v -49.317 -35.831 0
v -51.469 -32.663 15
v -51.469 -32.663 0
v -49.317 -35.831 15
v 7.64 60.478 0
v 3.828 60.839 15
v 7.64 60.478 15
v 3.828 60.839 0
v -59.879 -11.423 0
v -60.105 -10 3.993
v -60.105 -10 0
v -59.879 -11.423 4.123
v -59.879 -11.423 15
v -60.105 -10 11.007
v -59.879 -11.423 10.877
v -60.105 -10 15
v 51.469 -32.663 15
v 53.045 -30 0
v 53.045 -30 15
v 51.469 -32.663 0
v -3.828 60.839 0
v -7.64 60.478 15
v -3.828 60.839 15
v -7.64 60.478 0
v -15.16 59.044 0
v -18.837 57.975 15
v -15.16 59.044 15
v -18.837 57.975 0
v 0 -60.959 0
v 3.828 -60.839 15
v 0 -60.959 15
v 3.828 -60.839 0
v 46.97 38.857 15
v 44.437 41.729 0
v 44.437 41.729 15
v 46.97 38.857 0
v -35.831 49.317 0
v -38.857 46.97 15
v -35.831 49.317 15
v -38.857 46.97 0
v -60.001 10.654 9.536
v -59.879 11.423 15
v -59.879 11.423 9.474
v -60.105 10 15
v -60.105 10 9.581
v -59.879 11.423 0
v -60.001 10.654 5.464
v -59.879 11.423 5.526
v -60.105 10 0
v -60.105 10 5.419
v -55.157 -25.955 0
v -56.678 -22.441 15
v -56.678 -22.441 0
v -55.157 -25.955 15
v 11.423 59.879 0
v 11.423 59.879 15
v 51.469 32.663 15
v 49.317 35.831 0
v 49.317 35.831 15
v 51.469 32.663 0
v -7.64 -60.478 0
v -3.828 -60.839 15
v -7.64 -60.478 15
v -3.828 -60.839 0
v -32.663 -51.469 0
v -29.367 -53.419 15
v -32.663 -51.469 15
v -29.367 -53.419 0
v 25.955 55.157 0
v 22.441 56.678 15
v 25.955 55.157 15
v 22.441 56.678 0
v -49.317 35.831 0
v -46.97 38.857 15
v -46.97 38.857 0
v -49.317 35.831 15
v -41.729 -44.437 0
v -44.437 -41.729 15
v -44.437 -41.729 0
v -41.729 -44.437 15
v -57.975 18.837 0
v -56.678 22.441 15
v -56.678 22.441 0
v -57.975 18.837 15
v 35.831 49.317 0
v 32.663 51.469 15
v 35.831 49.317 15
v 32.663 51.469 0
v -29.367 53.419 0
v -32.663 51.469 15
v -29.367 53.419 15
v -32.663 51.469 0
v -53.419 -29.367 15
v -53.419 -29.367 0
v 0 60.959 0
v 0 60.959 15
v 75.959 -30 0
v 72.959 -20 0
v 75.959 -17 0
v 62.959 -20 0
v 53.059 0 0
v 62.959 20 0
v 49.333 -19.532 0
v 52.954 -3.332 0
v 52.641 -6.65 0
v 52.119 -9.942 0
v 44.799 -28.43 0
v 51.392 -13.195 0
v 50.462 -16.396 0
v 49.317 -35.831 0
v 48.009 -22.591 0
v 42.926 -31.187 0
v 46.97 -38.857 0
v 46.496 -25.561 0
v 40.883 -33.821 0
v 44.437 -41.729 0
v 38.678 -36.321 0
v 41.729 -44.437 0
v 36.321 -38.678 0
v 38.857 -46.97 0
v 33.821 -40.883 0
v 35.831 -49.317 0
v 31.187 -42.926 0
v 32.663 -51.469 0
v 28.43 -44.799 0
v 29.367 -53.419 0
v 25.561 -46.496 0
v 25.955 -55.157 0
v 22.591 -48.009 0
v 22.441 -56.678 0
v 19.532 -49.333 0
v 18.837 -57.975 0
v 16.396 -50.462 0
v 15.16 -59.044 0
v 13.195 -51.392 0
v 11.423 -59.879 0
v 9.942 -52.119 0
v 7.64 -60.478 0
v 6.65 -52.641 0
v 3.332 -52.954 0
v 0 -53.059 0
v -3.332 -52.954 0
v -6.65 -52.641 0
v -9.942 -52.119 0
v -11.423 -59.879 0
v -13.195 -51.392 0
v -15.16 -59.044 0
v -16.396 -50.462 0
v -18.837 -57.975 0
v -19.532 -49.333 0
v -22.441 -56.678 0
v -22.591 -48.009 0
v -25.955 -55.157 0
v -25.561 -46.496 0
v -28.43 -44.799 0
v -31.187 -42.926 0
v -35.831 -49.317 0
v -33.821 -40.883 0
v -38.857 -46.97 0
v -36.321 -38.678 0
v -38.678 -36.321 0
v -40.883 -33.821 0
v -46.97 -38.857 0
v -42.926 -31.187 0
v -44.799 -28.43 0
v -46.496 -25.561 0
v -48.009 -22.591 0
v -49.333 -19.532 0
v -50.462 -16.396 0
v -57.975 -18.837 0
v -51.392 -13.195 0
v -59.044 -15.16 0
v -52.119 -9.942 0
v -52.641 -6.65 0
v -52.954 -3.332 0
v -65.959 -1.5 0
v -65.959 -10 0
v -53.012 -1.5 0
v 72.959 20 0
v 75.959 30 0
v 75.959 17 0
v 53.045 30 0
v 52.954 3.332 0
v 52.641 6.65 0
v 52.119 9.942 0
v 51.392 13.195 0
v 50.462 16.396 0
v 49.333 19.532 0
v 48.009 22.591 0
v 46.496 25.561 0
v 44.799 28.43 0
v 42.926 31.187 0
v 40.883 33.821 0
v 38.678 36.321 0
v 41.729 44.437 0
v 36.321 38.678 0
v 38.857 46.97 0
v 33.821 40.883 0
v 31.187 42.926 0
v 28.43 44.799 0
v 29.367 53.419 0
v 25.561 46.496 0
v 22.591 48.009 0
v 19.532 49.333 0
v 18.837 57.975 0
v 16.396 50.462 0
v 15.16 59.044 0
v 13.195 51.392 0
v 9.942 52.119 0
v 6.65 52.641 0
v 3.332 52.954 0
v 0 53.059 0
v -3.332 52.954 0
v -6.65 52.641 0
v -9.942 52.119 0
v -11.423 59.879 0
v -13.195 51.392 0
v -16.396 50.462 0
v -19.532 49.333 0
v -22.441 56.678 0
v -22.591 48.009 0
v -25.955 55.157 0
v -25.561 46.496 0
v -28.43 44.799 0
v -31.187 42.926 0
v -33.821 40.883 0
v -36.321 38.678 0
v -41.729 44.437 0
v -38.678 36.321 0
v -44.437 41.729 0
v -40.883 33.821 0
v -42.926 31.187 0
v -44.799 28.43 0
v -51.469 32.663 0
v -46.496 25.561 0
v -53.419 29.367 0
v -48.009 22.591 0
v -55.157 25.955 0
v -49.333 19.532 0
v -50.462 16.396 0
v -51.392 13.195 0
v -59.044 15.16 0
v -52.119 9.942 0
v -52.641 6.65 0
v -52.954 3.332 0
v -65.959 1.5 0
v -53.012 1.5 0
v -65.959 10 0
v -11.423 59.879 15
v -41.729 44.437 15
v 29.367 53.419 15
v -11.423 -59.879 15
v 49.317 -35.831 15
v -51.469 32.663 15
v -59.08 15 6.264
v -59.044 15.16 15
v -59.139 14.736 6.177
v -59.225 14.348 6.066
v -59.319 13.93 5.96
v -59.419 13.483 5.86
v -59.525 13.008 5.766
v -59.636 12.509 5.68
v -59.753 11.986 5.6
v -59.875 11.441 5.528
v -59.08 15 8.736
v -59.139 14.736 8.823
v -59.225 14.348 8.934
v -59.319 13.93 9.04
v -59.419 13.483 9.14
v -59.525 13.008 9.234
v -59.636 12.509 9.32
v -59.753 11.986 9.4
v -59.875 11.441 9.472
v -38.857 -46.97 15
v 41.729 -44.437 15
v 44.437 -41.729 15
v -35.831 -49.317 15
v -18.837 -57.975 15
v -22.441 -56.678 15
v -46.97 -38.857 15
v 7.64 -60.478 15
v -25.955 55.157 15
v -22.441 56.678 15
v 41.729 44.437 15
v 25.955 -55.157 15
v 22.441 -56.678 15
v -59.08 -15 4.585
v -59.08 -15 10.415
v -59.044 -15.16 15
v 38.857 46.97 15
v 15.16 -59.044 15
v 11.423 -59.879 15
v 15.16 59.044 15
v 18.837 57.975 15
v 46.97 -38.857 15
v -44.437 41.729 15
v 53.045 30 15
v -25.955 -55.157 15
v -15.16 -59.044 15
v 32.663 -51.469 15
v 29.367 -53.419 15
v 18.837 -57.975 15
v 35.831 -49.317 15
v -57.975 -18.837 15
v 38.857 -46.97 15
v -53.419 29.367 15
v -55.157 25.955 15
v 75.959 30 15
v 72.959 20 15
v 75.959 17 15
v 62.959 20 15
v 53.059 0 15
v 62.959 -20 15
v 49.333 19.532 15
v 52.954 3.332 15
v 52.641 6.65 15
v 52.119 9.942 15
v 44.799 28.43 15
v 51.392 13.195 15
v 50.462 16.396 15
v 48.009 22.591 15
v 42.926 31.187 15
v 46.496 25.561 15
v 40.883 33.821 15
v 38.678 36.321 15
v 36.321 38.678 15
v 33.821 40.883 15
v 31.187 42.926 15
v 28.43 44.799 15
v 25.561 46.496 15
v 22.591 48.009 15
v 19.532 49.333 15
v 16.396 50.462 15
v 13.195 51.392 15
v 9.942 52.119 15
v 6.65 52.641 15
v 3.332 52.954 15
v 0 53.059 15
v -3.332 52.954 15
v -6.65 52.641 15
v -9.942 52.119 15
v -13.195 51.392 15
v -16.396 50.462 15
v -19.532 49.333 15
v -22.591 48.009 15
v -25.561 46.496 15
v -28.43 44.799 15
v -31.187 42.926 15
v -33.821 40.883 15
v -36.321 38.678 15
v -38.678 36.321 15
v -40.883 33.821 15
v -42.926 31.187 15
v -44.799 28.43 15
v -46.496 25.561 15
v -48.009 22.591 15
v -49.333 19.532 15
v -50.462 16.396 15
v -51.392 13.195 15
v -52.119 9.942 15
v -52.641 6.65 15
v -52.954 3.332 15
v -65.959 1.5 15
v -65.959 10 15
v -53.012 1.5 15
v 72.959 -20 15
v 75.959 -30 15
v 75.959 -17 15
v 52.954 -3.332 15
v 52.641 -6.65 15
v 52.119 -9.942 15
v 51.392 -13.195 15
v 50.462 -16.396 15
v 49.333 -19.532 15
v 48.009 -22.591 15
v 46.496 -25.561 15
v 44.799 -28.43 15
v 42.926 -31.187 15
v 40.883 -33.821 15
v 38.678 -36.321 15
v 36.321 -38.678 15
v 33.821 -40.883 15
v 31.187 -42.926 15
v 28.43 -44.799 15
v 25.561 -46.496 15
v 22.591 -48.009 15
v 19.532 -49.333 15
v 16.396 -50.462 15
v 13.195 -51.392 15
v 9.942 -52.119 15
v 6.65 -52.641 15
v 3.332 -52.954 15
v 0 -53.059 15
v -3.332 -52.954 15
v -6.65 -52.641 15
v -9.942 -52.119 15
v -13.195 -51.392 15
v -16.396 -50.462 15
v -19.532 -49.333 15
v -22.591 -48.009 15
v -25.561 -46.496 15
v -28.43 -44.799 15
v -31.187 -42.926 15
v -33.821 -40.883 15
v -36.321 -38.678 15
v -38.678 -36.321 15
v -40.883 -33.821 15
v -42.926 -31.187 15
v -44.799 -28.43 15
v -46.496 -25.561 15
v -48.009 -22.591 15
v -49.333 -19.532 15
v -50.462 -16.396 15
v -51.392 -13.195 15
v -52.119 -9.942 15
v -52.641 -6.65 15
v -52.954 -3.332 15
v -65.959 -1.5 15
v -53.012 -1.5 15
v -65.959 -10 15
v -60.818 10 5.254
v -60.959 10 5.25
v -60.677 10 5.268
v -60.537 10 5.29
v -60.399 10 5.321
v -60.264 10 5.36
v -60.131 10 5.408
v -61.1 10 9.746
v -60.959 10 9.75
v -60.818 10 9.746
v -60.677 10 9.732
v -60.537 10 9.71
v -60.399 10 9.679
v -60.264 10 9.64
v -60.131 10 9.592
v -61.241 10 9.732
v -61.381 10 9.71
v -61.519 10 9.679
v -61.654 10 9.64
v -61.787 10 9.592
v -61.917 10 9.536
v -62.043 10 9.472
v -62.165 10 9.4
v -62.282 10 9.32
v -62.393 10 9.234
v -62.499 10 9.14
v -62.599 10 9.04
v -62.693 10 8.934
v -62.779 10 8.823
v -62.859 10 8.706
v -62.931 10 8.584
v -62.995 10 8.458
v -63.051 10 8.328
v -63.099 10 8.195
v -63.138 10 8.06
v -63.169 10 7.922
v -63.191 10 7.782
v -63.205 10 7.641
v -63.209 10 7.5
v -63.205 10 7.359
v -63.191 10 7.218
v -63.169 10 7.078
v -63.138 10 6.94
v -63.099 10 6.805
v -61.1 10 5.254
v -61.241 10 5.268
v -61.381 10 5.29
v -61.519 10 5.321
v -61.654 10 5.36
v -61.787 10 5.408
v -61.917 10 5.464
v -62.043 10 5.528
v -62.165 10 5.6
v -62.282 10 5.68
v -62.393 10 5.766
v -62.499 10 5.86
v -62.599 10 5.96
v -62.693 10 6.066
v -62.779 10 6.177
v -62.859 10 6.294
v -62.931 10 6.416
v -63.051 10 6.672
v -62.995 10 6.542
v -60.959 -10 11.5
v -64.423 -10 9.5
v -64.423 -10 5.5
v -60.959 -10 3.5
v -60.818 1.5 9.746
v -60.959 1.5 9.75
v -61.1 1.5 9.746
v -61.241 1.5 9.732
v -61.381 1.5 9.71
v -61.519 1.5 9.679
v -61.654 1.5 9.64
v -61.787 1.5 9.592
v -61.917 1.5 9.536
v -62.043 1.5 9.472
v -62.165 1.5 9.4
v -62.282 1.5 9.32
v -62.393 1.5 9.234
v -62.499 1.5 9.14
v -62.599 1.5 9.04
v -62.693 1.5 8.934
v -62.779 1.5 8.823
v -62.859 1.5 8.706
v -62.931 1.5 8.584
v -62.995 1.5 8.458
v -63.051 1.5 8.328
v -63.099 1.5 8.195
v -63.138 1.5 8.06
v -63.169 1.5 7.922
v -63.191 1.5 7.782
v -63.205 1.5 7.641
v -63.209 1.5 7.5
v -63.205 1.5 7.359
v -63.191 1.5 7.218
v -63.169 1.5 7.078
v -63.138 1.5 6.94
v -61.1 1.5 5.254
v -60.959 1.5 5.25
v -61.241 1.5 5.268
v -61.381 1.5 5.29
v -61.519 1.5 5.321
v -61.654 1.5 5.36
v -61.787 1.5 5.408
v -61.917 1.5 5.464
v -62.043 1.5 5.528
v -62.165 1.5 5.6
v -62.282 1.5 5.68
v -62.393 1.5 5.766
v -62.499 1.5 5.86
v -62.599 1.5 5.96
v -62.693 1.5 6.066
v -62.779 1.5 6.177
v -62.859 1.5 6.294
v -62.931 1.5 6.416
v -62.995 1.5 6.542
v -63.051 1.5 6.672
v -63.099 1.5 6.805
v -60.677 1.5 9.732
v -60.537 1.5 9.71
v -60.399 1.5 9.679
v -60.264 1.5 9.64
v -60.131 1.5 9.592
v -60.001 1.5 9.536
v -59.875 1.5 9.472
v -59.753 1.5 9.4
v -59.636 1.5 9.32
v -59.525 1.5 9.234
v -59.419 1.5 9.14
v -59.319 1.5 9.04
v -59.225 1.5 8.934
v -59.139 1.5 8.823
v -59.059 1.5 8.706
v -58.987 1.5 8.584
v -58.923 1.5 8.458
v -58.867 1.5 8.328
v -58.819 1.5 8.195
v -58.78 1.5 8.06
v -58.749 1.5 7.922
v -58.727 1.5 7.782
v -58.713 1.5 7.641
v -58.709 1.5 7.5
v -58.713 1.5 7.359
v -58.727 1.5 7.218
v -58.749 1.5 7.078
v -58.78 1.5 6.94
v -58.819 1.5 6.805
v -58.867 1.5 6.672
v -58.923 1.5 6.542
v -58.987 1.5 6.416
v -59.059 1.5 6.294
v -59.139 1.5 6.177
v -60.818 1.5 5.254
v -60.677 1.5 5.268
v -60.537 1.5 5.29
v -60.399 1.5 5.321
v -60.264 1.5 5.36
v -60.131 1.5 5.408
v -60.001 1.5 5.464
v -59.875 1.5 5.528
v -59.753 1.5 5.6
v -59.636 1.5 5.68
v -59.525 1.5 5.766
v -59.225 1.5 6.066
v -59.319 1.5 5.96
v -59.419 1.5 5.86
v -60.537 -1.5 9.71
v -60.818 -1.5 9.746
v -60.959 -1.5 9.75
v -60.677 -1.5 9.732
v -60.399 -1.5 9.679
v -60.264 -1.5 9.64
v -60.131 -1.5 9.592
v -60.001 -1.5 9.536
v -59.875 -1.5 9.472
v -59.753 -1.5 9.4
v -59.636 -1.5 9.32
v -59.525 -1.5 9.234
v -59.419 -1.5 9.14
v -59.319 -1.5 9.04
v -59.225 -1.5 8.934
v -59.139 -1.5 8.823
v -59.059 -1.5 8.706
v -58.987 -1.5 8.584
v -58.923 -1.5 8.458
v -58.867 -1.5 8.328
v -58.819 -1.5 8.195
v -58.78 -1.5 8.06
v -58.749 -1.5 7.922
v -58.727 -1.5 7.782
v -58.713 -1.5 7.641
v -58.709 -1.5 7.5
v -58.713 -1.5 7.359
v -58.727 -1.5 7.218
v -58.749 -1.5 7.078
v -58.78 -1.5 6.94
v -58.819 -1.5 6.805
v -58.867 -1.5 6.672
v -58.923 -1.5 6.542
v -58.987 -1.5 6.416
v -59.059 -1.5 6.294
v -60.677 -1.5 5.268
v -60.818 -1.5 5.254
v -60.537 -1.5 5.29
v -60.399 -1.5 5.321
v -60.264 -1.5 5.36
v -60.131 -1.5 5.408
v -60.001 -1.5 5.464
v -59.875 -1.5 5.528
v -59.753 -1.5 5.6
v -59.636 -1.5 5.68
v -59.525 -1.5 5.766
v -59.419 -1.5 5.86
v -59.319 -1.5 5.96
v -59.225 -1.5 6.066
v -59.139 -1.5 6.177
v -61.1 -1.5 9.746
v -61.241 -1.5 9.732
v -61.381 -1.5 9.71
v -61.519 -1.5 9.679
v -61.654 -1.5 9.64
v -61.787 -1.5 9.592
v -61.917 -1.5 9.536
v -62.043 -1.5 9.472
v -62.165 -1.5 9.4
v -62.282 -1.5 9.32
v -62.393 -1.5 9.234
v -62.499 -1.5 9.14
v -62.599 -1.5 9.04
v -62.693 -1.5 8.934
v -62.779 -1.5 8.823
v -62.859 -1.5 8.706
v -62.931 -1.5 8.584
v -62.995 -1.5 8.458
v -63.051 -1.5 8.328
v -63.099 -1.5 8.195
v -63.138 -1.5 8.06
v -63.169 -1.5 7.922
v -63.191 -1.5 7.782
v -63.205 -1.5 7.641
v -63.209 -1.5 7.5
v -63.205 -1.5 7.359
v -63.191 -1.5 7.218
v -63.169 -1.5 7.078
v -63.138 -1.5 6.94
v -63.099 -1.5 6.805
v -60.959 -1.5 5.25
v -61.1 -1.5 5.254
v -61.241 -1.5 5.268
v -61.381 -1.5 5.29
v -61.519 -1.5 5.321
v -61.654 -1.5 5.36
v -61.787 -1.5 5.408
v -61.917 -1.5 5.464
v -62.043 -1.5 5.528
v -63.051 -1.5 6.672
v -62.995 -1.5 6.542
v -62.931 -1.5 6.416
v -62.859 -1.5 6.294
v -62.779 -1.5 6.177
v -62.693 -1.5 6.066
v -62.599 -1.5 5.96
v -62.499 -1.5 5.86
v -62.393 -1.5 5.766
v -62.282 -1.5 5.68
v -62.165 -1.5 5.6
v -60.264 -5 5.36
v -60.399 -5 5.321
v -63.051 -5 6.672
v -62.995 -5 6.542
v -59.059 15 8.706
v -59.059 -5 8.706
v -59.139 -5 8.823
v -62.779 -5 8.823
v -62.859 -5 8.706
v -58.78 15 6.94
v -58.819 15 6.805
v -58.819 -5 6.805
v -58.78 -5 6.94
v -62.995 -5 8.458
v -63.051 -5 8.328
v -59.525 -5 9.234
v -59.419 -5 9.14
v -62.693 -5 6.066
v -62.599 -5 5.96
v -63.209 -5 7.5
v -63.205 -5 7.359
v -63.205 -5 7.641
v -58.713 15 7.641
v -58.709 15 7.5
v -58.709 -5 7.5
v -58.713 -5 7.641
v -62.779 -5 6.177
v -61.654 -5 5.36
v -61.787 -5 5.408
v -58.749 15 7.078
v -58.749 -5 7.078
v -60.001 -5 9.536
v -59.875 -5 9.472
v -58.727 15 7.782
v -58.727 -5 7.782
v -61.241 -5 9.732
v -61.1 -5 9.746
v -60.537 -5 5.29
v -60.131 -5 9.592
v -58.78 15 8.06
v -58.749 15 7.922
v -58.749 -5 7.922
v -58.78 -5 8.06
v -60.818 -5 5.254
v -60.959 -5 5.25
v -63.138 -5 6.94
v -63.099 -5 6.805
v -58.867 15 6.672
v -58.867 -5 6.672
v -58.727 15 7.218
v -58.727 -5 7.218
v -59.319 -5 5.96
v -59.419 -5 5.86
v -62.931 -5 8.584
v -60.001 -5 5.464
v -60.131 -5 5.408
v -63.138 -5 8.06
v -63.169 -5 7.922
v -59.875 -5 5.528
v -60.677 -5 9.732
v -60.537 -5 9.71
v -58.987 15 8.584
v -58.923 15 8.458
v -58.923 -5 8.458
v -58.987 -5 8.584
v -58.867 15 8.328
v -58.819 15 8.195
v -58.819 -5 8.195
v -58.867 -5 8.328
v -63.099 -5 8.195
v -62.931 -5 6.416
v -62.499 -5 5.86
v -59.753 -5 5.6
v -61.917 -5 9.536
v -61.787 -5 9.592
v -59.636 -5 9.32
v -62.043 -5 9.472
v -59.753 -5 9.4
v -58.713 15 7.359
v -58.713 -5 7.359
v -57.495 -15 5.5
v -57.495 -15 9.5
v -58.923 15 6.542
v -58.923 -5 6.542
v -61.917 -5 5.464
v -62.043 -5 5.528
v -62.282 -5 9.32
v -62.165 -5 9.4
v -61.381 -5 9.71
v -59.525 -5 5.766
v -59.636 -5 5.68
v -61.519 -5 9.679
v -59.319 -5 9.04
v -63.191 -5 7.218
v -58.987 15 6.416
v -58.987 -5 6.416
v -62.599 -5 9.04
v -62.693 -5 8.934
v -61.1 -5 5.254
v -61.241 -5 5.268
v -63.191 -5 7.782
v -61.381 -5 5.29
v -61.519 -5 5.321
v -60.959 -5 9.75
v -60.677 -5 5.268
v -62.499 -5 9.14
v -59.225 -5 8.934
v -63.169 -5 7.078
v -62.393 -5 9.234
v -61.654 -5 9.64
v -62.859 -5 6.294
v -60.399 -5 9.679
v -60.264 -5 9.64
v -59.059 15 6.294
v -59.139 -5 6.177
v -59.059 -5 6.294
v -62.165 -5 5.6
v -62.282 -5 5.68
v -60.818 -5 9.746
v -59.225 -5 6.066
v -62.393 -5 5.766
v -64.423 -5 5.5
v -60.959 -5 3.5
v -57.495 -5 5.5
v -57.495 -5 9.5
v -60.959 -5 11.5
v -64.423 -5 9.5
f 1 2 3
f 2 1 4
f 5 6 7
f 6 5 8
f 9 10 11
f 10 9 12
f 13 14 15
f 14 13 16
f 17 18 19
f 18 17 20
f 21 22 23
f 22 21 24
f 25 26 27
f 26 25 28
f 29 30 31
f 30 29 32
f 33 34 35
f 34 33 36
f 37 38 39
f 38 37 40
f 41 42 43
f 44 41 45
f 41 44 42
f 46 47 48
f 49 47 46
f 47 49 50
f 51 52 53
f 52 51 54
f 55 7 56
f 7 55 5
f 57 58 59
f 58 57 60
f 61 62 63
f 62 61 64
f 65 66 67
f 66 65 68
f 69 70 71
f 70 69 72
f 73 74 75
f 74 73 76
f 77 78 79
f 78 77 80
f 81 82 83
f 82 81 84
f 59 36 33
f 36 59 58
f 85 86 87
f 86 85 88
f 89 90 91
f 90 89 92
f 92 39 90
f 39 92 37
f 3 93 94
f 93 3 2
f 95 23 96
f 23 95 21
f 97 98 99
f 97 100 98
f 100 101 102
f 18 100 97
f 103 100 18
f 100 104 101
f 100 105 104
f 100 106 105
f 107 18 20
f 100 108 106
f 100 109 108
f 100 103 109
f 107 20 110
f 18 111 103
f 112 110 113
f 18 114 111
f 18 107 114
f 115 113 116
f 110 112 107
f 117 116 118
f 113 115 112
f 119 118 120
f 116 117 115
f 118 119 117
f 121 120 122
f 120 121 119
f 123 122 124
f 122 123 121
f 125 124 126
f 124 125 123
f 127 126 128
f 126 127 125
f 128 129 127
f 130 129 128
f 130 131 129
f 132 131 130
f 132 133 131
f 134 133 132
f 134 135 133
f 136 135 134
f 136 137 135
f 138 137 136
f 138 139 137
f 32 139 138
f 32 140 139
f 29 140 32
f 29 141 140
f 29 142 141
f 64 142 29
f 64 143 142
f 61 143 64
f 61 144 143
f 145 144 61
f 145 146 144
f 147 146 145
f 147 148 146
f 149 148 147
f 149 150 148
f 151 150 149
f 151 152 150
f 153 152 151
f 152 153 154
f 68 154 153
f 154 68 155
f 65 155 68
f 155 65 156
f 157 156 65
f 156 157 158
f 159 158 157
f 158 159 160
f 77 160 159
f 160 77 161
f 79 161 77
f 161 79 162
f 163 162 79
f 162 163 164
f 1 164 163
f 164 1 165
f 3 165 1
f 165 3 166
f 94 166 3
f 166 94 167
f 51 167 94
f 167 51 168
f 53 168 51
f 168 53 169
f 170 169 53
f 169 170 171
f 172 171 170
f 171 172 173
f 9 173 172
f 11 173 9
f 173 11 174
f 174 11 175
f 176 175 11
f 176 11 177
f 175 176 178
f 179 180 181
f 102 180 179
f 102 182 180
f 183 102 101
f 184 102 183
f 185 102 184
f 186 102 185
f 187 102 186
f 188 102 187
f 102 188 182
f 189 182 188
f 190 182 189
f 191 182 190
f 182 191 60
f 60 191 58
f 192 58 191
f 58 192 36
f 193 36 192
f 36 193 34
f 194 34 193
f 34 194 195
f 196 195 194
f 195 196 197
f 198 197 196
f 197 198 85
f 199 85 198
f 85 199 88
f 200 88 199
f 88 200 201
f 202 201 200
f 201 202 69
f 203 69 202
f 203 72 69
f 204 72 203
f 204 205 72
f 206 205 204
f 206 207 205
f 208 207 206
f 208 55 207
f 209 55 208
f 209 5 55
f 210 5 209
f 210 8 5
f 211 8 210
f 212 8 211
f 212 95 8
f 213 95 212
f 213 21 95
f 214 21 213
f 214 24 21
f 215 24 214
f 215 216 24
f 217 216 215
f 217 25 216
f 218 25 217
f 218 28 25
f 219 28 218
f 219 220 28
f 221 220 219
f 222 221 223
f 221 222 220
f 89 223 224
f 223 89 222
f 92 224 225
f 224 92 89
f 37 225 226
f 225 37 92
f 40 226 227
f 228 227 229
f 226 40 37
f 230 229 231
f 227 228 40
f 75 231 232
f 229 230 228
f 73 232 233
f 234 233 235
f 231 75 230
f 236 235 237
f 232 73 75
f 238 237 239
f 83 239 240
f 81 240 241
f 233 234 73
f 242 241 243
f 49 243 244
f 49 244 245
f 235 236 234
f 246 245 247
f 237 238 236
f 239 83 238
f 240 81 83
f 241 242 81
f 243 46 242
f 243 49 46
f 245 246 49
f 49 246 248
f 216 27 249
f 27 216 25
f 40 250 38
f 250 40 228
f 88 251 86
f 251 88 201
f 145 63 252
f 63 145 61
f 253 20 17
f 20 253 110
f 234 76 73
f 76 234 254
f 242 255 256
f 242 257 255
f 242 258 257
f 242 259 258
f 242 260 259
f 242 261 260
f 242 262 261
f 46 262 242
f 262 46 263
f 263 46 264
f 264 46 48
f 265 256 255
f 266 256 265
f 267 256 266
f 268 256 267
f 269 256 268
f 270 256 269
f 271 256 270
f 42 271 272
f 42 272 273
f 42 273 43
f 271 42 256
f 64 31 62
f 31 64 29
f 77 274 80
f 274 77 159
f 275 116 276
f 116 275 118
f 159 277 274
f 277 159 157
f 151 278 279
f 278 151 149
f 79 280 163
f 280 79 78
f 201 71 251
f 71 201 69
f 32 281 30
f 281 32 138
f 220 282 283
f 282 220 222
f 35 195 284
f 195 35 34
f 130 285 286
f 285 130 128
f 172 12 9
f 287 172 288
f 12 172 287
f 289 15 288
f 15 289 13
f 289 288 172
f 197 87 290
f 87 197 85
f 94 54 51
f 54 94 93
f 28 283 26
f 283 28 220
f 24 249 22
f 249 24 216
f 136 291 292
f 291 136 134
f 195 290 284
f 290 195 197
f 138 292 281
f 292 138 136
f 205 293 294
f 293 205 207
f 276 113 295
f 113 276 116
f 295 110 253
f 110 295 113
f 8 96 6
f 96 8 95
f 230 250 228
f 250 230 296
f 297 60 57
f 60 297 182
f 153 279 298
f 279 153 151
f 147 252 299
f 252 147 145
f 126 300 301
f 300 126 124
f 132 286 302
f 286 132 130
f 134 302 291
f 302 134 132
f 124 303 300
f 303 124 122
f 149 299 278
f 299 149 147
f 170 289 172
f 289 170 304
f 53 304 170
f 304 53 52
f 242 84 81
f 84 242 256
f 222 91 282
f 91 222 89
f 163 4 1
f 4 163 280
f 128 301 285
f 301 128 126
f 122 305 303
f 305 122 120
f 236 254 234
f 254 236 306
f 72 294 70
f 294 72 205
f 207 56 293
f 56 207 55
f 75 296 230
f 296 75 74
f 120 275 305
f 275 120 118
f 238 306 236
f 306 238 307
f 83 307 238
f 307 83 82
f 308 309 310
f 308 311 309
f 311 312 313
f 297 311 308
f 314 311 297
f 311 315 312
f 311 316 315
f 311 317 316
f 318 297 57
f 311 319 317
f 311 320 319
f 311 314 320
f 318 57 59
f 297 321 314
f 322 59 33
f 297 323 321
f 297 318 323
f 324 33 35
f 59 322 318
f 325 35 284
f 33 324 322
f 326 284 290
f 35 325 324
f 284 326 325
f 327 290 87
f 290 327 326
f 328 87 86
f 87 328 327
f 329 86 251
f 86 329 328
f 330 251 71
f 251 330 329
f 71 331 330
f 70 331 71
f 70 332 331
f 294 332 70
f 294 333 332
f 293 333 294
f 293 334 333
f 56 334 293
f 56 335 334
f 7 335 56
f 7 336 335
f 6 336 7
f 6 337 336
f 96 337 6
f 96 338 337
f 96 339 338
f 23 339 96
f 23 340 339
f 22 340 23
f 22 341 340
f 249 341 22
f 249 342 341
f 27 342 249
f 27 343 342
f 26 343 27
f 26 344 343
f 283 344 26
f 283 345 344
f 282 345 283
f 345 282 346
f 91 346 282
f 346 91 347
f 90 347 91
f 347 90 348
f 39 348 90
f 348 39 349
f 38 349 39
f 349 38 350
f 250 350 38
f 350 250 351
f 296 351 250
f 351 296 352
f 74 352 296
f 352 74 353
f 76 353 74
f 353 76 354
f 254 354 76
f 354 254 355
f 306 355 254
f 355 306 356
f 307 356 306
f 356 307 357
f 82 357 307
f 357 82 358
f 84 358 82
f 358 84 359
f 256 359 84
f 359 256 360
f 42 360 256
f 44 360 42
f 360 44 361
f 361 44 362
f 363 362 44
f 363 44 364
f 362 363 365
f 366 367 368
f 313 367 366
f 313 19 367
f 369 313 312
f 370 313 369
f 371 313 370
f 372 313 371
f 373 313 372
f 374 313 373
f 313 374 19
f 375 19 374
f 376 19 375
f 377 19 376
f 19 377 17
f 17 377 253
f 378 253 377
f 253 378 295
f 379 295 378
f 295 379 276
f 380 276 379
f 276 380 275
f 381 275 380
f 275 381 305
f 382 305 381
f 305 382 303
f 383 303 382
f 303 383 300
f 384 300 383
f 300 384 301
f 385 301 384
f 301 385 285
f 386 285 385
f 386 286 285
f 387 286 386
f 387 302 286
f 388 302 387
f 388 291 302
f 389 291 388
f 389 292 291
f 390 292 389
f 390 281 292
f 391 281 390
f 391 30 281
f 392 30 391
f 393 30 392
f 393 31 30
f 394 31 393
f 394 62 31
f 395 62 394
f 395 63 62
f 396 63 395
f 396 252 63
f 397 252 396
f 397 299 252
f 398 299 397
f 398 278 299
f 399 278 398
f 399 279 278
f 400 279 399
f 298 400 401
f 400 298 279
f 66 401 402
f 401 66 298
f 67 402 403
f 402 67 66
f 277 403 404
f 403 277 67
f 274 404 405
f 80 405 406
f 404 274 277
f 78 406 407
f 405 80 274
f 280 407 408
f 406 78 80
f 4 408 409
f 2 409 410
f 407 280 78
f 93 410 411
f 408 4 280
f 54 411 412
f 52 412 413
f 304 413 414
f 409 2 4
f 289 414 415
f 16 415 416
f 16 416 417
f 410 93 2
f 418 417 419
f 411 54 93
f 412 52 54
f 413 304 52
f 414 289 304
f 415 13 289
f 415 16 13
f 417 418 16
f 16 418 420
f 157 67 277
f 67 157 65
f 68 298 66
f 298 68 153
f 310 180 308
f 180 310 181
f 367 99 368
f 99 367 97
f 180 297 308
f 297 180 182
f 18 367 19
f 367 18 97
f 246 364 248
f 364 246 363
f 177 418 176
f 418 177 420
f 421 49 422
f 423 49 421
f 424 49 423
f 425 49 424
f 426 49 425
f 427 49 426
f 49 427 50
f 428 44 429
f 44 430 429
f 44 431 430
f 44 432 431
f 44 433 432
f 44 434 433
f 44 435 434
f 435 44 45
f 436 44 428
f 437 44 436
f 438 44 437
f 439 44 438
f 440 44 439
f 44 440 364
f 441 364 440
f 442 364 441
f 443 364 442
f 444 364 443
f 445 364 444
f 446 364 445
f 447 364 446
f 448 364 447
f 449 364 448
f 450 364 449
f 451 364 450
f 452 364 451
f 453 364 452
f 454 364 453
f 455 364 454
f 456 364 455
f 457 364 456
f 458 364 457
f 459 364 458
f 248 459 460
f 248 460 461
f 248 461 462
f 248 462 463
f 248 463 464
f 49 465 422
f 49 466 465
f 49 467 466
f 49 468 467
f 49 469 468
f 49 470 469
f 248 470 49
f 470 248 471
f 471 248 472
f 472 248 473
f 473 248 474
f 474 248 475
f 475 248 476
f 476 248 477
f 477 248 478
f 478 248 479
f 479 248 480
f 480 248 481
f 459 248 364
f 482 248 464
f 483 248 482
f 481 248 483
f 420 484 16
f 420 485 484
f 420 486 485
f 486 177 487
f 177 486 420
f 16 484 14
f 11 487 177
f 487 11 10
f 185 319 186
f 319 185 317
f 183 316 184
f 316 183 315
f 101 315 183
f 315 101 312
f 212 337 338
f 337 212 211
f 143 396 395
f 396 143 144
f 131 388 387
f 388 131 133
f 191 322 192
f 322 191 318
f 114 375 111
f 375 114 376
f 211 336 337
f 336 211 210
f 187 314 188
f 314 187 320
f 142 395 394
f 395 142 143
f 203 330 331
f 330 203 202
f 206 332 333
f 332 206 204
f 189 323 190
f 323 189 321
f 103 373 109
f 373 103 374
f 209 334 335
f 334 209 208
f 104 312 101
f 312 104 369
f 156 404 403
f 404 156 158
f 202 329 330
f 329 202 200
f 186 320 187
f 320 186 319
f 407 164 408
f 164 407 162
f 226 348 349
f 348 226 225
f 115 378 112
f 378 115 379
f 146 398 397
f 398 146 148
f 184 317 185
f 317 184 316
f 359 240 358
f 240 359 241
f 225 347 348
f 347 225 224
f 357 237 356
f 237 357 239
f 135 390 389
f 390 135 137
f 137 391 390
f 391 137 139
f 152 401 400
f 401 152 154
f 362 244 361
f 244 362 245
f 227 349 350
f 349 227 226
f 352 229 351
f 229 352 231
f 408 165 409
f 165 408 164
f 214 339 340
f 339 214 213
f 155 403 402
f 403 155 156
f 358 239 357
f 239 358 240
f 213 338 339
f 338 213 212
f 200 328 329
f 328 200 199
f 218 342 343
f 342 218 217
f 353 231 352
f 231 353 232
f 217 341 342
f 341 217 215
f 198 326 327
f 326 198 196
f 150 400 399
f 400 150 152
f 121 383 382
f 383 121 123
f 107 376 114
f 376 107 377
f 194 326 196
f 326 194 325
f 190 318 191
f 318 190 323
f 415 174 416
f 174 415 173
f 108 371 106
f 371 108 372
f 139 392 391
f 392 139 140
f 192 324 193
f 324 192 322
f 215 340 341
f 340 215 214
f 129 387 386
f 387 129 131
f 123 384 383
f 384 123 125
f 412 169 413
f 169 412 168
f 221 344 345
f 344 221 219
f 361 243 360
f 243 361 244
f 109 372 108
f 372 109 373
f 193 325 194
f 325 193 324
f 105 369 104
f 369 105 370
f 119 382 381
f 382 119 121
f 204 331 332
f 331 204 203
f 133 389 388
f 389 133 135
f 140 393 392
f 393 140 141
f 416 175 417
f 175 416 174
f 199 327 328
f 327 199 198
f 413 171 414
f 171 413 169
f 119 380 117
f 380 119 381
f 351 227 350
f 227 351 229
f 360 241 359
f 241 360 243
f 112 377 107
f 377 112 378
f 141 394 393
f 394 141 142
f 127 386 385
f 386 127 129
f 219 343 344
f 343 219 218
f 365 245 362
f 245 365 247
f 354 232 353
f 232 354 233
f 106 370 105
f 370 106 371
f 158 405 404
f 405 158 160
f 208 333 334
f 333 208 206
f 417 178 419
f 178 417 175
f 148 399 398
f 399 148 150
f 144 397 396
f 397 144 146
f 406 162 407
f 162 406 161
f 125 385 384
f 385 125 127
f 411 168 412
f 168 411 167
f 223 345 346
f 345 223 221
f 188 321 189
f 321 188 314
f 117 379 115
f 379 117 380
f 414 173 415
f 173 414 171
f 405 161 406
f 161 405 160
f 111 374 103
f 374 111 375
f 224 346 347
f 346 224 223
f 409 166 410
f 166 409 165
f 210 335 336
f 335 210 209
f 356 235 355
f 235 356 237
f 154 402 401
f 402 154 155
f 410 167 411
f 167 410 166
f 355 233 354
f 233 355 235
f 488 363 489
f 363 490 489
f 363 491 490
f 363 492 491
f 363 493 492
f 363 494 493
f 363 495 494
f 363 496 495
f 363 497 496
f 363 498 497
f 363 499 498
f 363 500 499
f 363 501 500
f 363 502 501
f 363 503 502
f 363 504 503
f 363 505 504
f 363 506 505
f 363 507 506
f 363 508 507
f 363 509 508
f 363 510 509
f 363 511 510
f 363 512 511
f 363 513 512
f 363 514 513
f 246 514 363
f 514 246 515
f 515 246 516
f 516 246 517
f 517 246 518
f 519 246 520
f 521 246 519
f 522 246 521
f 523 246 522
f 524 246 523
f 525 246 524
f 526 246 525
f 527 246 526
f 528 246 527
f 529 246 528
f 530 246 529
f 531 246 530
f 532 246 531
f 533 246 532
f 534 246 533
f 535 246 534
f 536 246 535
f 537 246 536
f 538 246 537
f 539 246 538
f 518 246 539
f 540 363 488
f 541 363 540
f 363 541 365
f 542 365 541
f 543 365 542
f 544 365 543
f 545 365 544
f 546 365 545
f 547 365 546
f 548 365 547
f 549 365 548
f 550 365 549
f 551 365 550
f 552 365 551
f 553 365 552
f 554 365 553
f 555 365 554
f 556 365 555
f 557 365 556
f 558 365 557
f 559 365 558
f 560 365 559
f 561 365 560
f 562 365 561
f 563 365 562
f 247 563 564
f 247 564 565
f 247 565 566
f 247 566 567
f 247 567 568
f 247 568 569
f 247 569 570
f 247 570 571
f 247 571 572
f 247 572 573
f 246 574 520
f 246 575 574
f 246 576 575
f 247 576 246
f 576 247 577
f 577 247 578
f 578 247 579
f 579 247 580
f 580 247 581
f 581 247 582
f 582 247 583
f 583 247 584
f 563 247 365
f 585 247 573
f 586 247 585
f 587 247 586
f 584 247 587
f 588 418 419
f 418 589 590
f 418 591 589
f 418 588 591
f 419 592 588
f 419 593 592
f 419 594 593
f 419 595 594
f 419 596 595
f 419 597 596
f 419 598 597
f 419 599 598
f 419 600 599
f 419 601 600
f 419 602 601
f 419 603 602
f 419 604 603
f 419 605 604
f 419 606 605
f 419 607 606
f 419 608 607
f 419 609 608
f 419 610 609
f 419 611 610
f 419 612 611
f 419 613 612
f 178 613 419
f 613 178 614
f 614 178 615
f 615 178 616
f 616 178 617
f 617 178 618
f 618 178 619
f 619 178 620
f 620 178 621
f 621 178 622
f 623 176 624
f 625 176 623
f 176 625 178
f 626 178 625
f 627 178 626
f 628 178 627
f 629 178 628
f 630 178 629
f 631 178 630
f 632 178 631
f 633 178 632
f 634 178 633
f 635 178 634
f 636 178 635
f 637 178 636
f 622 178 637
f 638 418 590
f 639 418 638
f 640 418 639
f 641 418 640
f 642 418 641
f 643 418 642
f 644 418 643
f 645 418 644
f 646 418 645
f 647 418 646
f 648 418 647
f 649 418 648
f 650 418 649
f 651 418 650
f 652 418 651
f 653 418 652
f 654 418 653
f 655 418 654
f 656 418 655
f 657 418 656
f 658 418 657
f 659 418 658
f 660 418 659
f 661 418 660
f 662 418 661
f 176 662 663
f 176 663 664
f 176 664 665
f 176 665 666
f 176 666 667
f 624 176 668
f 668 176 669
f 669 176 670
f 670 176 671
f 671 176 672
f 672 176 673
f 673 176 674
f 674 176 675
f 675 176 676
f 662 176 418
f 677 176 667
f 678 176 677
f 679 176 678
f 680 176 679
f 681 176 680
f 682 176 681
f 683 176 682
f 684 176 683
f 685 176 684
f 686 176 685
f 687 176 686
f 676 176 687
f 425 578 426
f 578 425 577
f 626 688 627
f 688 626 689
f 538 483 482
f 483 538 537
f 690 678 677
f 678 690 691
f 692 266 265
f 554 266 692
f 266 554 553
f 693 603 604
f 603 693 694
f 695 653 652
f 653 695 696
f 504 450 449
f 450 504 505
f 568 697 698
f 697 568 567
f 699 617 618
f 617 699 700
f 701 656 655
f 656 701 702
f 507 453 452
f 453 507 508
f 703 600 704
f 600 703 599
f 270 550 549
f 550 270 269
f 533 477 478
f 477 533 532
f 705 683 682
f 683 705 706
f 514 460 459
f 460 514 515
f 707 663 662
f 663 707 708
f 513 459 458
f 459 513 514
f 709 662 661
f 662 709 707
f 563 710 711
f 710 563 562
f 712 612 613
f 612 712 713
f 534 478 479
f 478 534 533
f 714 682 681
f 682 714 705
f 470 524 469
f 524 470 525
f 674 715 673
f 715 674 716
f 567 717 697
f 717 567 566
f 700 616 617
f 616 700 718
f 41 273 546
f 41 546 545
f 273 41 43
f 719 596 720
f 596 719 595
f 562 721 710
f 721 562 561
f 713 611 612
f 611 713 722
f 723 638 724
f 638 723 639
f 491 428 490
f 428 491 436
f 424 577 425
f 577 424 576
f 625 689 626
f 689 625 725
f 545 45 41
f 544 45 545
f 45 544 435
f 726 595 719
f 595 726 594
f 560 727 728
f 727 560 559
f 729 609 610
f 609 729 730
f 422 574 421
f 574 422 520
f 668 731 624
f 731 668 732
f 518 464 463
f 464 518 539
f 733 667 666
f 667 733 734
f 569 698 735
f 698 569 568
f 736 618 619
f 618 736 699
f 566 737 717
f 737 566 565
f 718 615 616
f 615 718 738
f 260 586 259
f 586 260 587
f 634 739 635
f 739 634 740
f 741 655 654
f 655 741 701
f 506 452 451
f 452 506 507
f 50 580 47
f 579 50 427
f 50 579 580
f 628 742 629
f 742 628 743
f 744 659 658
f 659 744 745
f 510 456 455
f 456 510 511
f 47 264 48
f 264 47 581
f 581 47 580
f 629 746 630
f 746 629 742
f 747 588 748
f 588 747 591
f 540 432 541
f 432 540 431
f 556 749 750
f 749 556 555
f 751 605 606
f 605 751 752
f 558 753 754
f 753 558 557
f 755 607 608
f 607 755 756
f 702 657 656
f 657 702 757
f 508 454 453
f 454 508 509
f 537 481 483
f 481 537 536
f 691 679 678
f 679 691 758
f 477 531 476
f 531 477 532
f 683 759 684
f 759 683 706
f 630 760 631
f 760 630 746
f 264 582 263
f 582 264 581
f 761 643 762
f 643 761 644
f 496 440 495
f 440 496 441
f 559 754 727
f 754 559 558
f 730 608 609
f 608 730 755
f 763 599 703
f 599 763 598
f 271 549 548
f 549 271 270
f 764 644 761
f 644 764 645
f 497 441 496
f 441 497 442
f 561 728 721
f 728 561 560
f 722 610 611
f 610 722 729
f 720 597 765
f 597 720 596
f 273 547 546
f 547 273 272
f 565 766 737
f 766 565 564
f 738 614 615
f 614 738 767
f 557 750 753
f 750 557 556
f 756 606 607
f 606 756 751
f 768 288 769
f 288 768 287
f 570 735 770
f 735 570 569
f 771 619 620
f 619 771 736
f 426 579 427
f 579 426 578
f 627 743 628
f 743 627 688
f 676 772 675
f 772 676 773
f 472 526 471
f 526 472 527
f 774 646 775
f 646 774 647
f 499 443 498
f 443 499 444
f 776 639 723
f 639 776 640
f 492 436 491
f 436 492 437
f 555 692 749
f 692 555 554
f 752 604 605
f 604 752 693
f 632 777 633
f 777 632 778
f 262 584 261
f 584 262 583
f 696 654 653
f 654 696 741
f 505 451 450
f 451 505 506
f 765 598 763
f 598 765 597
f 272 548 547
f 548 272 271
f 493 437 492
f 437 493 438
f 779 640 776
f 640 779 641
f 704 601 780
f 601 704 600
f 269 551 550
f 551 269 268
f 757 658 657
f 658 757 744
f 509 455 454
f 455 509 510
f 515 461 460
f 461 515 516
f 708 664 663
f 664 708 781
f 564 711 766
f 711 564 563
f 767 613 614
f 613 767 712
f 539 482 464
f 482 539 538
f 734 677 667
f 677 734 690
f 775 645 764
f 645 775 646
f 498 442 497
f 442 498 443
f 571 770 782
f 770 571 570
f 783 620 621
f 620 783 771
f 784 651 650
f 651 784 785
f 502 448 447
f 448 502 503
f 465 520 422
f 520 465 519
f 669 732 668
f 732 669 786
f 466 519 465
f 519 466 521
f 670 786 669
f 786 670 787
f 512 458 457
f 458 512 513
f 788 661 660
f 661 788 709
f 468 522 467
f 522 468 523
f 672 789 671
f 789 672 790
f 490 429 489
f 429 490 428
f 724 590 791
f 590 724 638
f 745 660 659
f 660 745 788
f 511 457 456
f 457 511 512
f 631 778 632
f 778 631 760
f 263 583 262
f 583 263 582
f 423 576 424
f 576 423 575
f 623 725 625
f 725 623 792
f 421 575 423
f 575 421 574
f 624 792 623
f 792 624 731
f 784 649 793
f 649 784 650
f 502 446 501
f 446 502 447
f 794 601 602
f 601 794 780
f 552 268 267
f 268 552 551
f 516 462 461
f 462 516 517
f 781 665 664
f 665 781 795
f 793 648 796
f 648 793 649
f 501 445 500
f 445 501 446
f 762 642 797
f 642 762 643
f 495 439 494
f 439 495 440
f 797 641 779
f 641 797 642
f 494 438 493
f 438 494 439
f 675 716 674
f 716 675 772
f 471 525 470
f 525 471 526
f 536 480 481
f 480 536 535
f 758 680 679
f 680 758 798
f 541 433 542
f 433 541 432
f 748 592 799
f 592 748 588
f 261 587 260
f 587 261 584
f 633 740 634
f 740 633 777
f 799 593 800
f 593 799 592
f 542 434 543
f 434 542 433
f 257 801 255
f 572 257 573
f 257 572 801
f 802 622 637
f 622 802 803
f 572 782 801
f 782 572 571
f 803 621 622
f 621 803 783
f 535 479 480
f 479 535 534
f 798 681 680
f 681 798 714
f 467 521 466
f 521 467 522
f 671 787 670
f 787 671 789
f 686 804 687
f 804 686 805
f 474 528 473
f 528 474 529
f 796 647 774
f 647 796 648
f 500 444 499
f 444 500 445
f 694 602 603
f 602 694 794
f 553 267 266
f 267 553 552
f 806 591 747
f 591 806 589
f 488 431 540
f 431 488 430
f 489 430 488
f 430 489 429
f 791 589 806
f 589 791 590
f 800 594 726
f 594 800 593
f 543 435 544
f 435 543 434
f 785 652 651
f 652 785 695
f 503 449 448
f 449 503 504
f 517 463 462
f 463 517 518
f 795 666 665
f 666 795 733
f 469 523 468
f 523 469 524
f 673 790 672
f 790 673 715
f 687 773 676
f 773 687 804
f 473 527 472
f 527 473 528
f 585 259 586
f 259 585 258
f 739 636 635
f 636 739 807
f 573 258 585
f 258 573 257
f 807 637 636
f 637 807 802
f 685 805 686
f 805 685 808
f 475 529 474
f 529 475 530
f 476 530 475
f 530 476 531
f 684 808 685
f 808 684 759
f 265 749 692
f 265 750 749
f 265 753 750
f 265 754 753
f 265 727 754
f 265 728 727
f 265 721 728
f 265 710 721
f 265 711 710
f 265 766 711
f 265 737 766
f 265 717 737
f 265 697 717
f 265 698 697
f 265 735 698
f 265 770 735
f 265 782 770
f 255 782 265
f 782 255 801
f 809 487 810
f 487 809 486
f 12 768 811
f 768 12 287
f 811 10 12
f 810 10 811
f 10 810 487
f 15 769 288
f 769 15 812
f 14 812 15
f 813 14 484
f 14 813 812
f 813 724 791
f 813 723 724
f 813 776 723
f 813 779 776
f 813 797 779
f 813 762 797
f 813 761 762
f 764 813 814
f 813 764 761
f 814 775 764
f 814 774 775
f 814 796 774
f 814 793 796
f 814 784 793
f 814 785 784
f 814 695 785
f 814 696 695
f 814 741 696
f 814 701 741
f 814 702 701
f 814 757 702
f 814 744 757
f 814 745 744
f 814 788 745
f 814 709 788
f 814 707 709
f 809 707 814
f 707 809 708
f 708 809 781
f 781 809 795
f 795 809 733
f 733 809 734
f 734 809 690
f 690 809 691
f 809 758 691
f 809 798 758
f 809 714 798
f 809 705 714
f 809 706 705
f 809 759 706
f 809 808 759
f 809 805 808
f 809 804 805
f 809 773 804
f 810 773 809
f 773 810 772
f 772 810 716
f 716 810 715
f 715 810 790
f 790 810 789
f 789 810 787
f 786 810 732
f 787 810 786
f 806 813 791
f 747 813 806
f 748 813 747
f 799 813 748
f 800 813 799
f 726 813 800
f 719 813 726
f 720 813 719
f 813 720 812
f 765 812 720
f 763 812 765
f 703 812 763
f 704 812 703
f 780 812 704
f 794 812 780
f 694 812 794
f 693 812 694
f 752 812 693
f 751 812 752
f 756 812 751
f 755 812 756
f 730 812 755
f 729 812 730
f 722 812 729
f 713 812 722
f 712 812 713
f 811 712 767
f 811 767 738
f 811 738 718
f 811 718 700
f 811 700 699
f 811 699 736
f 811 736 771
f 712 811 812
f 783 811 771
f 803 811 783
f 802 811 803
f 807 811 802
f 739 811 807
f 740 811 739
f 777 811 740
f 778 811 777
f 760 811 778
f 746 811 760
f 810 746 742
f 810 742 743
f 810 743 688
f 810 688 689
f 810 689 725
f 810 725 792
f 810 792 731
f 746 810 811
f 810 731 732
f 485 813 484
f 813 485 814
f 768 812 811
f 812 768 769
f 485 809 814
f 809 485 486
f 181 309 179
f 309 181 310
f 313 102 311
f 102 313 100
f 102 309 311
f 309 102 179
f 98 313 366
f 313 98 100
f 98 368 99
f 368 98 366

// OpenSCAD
// --- PARAMETERS ---
$fn = 100;

// Telescope Dimensions (from your drawing)
flange_dia_in = 4.170; 
flange_dia = flange_dia_in * 25.4; // Convert to mm
flange_depth = 15; // Adjustment for how much of the flange to grip

// Clamp Settings
wall_thickness = 8;
gap_width = 3;         // The split in the ring
clamp_bolt_dia = 4.5;   // For M4 bolt
nut_trap_dia = 8.0;     // For M4 nut hex
mounting_plate_w = 60;  // Width of the platform for the Pi case

// --- MODULES ---

module base_clamp() {
    difference() {
        union() {
            // Main Ring
            cylinder(h=flange_depth, d=flange_dia + (wall_thickness*2));
            
            // Mounting Platform (where the Pi will sit)
            translate([flange_dia/2, -mounting_plate_w/2, 0])
                cube([wall_thickness + 15, mounting_plate_w, flange_depth]);
            
            // Clamping Lugs (the "ears")
            translate([-(flange_dia/2 + wall_thickness + 5), -10, 0])
                cube([15, 20, flange_depth]);
        }
        
        // Hole for Telescope Flange (with 0.2mm tolerance)
        translate([0,0,-1])
            cylinder(h=flange_depth+2, d=flange_dia + 0.2);
        
        // The Split Gap
        translate([-flange_dia, -gap_width/2, -1])
            cube([flange_dia, gap_width, flange_depth+2]);
            
        // Bolt Hole through the ears
        translate([-(flange_dia/2 + 8), 15, flange_depth/2])
            rotate([90,0,0])
            cylinder(h=30, d=clamp_bolt_dia);
            
        // Nut Trap (Hexagon)
        translate([-(flange_dia/2 + 8), -5, flange_depth/2])
            rotate([90,30,0])
            cylinder(h=10, d=nut_trap_dia, $fn=6);
            
        // Dovetail Slot (The "Female" side of the quick release)
        translate([flange_dia/2 + 10, 0, flange_depth/2])
            dovetail_slot();
    }
}

module dovetail_slot() {
    // Simple trapezoid cutout for quick release
    rotate([0,0,0])
    hull() {
        translate([0, -20, -flange_depth]) cube([10, 40, flange_depth*2]);
        translate([5, -15, -flange_depth]) cube([10, 30, flange_depth*2]);
    }
}

// --- RENDER ---
base_clamp();

// Uncomment the line below to see the "Male" plate that attaches to the Pi Case
// translate([80, 0, 0]) dovetail_male_plate();

module dovetail_male_plate() {
    // This part gets screwed to the bottom of your Pi Case
    width = 38;
    height = 10;
    length = 50;
    
    difference() {
        hull() {
            translate([0, -width/2, 0]) cube([height, width, length]);
            translate([-5, -(width-10)/2, 0]) cube([height, width-10, length]);
        }
        // Add screw holes here to attach to your Pi Case
        translate([height/2, 0, 10]) rotate([0,90,0]) cylinder(h=20, d=4, center=true);
        translate([height/2, 0, length-10]) rotate([0,90,0]) cylinder(h=20, d=4, center=true);
    }
}
